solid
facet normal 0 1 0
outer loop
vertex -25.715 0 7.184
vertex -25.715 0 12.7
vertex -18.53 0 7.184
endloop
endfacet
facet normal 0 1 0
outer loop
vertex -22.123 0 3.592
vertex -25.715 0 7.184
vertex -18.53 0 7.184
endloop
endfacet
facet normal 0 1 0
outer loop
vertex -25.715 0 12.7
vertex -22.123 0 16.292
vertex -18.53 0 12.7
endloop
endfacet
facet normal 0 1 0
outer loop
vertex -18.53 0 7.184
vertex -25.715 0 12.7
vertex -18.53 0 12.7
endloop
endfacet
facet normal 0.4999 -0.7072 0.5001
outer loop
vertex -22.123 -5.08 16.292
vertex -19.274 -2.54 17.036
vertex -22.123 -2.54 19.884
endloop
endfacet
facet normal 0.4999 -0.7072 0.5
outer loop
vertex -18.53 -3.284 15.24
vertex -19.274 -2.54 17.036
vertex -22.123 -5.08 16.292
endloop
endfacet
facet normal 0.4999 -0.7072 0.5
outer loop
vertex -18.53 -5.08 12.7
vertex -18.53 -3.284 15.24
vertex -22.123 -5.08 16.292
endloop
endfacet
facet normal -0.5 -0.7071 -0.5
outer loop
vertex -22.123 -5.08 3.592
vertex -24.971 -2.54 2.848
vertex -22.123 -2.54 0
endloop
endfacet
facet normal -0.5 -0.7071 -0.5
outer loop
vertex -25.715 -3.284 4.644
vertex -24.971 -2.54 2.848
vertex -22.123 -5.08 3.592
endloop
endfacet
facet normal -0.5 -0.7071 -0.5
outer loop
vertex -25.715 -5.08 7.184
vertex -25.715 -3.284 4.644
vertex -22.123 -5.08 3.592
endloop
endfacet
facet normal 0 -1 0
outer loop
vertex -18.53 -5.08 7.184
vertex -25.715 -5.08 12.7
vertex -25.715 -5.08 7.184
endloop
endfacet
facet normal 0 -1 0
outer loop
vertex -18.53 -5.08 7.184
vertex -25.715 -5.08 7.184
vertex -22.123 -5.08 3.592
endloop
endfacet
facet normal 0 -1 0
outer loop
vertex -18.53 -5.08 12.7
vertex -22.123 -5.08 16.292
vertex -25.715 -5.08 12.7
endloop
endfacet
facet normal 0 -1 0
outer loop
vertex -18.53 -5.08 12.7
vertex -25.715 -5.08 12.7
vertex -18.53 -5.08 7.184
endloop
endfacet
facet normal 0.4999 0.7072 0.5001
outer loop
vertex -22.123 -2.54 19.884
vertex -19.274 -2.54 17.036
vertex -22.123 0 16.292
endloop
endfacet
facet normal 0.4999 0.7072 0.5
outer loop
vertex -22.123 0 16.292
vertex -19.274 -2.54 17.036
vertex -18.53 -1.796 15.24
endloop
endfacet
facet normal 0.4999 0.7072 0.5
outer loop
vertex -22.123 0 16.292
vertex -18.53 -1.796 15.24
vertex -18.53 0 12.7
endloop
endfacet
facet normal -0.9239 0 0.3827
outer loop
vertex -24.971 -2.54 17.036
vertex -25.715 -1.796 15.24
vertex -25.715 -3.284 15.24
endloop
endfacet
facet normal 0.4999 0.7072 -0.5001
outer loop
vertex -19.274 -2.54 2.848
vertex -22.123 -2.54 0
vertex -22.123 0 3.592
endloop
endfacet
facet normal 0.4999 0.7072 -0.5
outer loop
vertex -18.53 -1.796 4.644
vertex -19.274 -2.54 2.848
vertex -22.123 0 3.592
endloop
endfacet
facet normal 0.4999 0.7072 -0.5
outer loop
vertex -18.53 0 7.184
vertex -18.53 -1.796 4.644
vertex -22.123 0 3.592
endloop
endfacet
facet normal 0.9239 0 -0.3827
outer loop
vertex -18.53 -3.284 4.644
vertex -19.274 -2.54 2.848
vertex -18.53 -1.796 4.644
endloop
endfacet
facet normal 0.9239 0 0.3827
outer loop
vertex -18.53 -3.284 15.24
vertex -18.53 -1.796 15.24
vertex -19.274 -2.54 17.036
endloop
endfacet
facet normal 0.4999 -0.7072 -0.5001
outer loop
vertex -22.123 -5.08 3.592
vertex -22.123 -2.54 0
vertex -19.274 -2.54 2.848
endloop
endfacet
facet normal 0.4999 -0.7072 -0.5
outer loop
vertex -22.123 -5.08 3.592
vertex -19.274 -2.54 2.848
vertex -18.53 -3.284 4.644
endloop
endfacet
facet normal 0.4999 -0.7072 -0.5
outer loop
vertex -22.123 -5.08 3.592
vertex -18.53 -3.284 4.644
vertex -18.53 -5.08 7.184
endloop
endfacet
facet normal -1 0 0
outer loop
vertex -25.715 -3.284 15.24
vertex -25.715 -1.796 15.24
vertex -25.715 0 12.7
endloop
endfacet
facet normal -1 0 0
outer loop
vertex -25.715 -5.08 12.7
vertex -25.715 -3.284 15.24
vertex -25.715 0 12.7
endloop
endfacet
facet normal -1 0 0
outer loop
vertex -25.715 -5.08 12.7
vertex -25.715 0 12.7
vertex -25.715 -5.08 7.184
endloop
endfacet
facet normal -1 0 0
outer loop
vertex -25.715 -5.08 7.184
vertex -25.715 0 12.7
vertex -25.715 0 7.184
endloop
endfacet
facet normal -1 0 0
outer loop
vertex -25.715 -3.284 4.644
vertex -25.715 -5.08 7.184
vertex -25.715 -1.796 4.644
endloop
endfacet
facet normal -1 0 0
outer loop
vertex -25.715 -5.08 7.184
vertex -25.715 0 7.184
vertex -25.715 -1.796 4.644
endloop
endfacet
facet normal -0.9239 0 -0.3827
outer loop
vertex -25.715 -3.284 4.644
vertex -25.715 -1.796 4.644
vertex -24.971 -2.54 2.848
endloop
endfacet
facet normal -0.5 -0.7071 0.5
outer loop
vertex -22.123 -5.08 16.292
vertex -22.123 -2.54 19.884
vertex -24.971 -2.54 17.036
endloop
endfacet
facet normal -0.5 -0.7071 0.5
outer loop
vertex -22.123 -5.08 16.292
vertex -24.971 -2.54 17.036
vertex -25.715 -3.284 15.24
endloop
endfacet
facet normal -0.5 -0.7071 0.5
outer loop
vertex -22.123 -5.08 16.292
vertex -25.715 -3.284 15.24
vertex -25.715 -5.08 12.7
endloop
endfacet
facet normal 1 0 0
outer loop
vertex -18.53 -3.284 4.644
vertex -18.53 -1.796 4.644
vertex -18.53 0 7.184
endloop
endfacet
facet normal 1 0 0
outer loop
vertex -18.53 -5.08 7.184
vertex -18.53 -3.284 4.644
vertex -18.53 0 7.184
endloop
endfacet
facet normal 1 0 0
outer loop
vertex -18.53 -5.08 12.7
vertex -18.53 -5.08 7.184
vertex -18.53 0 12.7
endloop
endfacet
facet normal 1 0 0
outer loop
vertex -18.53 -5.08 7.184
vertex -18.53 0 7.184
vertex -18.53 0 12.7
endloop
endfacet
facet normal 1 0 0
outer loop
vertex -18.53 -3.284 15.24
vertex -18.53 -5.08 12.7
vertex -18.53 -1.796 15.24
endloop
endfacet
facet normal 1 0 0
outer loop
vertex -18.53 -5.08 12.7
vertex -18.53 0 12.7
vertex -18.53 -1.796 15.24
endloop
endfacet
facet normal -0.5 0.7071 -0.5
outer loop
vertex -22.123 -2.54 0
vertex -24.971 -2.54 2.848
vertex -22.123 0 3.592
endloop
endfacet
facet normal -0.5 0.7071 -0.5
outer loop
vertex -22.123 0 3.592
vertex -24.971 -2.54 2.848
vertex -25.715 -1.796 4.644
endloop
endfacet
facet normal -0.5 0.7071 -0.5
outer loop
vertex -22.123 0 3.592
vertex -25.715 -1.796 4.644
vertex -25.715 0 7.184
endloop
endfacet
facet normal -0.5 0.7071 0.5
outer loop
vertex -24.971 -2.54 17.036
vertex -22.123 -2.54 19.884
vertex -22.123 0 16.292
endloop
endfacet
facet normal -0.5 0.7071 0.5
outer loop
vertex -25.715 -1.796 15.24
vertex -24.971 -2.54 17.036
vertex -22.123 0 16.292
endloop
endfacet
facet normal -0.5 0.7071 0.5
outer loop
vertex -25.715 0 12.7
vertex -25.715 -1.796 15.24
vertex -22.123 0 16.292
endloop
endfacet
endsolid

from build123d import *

# Parameters (mm, degrees)
F1_DEPTH    = 5.08
F2_T1_DEPTH = 18.1441495789
F2_T3_DEPTH = 18.1441495789
F2_T5_DEPTH = 18.1441495789
F2_T7_DEPTH = 18.1441495789
F2_T9_DEPTH = 10.8131399699


# Not quite as in the source:
# - a fillet or chamfer that OpenCascade refuses, or shapes differently, is made with other operations: its cross-section is extruded or revolved along the edge and cut away or added


with BuildPart() as f1:
    # F0 (on Front) → F1 (new body)
    with BuildSketch(Plane.XZ):
        Polygon((-25.7146830065, 3.5921024484), (-22.1225805581, 0), (-18.5304781096, 3.5921024484), (-18.5304781096, 16.2921024484), (-22.1225805581, 19.8842048969), (-25.7146830065, 16.2921024484), align=None)
    extrude(amount=F1_DEPTH)

    # F2: chamfer of 2.54 on 12 edges, made by hand

    # F2_s2 → F2_t1 (cut)
    with BuildSketch(Plane(origin=(-12.7924159002, 0, 12.7924159002), x_dir=(0, 1, 0), z_dir=(-0.7071067812, 0, 0.7071067812))):
        Polygon((-2.54, 1.5827706089), (-5.08, 4.1227706089), (-5.08, 1.5827706089), align=None)
        Polygon((-2.54, 1.5827706089), (0, 4.1227706089), (0, 1.5827706089), align=None)
    extrude(amount=F2_T1_DEPTH, mode=Mode.SUBTRACT)

    # F2_s4 → F2_t3 (cut)
    with BuildSketch(Plane(origin=(3.4996865482, 0, 3.4996865482), x_dir=(0, 1, 0), z_dir=(-0.7071067812, 0, -0.7071067812))):
        Polygon((-2.54, -29.703282851), (-5.08, -27.163282851), (-5.08, -29.703282851), align=None)
        Polygon((-2.54, -29.703282851), (0, -27.163282851), (0, -29.703282851), align=None)
    extrude(amount=F2_T3_DEPTH, mode=Mode.SUBTRACT)

    # F2_s6 → F2_t5 (cut)
    with BuildSketch(Plane(origin=(-19.2722671063, 0, 19.2722671063), x_dir=(0, 1, 0), z_dir=(0.7071067812, 0, -0.7071067812))):
        Polygon((-2.54, -15.64302673), (-5.08, -13.10302673), (-5.08, -15.64302673), align=None)
        Polygon((-2.54, -15.64302673), (0, -13.10302673), (0, -15.64302673), align=None)
    extrude(amount=F2_T5_DEPTH, mode=Mode.SUBTRACT)

    # F2_s8 → F2_t7 (cut)
    with BuildSketch(Plane(origin=(-15.6801646579, 0, -15.6801646579), x_dir=(0, 1, 0), z_dir=(0.7071067812, 0, 0.7071067812))):
        Polygon((-2.54, 15.64302673), (-5.08, 18.18302673), (-5.08, 15.64302673), align=None)
        Polygon((-2.54, 15.64302673), (0, 18.18302673), (0, 15.64302673), align=None)
    extrude(amount=F2_T7_DEPTH, mode=Mode.SUBTRACT)

    # F2_s10 → F2_t9 (cut)
    with BuildSketch(Plane.XZ.offset(-2.8665699849)):
        Polygon((-19.2744268854, 2.8481536726), (-18.5304781096, 4.6442048969), (-18.5304781096, 3.5921024484), align=None)
        Polygon((-18.5304781096, 15.24), (-19.2744268854, 17.0360512242), (-18.5304781096, 16.2921024484), align=None)
        Polygon((-25.7146830065, 15.24), (-24.9707342307, 17.0360512242), (-25.7146830065, 16.2921024484), align=None)
        Polygon((-25.7146830065, 4.6442048969), (-24.9707342307, 2.8481536726), (-25.7146830065, 3.5921024484), align=None)
    extrude(amount=F2_T9_DEPTH, mode=Mode.SUBTRACT)


solid = f1.part
